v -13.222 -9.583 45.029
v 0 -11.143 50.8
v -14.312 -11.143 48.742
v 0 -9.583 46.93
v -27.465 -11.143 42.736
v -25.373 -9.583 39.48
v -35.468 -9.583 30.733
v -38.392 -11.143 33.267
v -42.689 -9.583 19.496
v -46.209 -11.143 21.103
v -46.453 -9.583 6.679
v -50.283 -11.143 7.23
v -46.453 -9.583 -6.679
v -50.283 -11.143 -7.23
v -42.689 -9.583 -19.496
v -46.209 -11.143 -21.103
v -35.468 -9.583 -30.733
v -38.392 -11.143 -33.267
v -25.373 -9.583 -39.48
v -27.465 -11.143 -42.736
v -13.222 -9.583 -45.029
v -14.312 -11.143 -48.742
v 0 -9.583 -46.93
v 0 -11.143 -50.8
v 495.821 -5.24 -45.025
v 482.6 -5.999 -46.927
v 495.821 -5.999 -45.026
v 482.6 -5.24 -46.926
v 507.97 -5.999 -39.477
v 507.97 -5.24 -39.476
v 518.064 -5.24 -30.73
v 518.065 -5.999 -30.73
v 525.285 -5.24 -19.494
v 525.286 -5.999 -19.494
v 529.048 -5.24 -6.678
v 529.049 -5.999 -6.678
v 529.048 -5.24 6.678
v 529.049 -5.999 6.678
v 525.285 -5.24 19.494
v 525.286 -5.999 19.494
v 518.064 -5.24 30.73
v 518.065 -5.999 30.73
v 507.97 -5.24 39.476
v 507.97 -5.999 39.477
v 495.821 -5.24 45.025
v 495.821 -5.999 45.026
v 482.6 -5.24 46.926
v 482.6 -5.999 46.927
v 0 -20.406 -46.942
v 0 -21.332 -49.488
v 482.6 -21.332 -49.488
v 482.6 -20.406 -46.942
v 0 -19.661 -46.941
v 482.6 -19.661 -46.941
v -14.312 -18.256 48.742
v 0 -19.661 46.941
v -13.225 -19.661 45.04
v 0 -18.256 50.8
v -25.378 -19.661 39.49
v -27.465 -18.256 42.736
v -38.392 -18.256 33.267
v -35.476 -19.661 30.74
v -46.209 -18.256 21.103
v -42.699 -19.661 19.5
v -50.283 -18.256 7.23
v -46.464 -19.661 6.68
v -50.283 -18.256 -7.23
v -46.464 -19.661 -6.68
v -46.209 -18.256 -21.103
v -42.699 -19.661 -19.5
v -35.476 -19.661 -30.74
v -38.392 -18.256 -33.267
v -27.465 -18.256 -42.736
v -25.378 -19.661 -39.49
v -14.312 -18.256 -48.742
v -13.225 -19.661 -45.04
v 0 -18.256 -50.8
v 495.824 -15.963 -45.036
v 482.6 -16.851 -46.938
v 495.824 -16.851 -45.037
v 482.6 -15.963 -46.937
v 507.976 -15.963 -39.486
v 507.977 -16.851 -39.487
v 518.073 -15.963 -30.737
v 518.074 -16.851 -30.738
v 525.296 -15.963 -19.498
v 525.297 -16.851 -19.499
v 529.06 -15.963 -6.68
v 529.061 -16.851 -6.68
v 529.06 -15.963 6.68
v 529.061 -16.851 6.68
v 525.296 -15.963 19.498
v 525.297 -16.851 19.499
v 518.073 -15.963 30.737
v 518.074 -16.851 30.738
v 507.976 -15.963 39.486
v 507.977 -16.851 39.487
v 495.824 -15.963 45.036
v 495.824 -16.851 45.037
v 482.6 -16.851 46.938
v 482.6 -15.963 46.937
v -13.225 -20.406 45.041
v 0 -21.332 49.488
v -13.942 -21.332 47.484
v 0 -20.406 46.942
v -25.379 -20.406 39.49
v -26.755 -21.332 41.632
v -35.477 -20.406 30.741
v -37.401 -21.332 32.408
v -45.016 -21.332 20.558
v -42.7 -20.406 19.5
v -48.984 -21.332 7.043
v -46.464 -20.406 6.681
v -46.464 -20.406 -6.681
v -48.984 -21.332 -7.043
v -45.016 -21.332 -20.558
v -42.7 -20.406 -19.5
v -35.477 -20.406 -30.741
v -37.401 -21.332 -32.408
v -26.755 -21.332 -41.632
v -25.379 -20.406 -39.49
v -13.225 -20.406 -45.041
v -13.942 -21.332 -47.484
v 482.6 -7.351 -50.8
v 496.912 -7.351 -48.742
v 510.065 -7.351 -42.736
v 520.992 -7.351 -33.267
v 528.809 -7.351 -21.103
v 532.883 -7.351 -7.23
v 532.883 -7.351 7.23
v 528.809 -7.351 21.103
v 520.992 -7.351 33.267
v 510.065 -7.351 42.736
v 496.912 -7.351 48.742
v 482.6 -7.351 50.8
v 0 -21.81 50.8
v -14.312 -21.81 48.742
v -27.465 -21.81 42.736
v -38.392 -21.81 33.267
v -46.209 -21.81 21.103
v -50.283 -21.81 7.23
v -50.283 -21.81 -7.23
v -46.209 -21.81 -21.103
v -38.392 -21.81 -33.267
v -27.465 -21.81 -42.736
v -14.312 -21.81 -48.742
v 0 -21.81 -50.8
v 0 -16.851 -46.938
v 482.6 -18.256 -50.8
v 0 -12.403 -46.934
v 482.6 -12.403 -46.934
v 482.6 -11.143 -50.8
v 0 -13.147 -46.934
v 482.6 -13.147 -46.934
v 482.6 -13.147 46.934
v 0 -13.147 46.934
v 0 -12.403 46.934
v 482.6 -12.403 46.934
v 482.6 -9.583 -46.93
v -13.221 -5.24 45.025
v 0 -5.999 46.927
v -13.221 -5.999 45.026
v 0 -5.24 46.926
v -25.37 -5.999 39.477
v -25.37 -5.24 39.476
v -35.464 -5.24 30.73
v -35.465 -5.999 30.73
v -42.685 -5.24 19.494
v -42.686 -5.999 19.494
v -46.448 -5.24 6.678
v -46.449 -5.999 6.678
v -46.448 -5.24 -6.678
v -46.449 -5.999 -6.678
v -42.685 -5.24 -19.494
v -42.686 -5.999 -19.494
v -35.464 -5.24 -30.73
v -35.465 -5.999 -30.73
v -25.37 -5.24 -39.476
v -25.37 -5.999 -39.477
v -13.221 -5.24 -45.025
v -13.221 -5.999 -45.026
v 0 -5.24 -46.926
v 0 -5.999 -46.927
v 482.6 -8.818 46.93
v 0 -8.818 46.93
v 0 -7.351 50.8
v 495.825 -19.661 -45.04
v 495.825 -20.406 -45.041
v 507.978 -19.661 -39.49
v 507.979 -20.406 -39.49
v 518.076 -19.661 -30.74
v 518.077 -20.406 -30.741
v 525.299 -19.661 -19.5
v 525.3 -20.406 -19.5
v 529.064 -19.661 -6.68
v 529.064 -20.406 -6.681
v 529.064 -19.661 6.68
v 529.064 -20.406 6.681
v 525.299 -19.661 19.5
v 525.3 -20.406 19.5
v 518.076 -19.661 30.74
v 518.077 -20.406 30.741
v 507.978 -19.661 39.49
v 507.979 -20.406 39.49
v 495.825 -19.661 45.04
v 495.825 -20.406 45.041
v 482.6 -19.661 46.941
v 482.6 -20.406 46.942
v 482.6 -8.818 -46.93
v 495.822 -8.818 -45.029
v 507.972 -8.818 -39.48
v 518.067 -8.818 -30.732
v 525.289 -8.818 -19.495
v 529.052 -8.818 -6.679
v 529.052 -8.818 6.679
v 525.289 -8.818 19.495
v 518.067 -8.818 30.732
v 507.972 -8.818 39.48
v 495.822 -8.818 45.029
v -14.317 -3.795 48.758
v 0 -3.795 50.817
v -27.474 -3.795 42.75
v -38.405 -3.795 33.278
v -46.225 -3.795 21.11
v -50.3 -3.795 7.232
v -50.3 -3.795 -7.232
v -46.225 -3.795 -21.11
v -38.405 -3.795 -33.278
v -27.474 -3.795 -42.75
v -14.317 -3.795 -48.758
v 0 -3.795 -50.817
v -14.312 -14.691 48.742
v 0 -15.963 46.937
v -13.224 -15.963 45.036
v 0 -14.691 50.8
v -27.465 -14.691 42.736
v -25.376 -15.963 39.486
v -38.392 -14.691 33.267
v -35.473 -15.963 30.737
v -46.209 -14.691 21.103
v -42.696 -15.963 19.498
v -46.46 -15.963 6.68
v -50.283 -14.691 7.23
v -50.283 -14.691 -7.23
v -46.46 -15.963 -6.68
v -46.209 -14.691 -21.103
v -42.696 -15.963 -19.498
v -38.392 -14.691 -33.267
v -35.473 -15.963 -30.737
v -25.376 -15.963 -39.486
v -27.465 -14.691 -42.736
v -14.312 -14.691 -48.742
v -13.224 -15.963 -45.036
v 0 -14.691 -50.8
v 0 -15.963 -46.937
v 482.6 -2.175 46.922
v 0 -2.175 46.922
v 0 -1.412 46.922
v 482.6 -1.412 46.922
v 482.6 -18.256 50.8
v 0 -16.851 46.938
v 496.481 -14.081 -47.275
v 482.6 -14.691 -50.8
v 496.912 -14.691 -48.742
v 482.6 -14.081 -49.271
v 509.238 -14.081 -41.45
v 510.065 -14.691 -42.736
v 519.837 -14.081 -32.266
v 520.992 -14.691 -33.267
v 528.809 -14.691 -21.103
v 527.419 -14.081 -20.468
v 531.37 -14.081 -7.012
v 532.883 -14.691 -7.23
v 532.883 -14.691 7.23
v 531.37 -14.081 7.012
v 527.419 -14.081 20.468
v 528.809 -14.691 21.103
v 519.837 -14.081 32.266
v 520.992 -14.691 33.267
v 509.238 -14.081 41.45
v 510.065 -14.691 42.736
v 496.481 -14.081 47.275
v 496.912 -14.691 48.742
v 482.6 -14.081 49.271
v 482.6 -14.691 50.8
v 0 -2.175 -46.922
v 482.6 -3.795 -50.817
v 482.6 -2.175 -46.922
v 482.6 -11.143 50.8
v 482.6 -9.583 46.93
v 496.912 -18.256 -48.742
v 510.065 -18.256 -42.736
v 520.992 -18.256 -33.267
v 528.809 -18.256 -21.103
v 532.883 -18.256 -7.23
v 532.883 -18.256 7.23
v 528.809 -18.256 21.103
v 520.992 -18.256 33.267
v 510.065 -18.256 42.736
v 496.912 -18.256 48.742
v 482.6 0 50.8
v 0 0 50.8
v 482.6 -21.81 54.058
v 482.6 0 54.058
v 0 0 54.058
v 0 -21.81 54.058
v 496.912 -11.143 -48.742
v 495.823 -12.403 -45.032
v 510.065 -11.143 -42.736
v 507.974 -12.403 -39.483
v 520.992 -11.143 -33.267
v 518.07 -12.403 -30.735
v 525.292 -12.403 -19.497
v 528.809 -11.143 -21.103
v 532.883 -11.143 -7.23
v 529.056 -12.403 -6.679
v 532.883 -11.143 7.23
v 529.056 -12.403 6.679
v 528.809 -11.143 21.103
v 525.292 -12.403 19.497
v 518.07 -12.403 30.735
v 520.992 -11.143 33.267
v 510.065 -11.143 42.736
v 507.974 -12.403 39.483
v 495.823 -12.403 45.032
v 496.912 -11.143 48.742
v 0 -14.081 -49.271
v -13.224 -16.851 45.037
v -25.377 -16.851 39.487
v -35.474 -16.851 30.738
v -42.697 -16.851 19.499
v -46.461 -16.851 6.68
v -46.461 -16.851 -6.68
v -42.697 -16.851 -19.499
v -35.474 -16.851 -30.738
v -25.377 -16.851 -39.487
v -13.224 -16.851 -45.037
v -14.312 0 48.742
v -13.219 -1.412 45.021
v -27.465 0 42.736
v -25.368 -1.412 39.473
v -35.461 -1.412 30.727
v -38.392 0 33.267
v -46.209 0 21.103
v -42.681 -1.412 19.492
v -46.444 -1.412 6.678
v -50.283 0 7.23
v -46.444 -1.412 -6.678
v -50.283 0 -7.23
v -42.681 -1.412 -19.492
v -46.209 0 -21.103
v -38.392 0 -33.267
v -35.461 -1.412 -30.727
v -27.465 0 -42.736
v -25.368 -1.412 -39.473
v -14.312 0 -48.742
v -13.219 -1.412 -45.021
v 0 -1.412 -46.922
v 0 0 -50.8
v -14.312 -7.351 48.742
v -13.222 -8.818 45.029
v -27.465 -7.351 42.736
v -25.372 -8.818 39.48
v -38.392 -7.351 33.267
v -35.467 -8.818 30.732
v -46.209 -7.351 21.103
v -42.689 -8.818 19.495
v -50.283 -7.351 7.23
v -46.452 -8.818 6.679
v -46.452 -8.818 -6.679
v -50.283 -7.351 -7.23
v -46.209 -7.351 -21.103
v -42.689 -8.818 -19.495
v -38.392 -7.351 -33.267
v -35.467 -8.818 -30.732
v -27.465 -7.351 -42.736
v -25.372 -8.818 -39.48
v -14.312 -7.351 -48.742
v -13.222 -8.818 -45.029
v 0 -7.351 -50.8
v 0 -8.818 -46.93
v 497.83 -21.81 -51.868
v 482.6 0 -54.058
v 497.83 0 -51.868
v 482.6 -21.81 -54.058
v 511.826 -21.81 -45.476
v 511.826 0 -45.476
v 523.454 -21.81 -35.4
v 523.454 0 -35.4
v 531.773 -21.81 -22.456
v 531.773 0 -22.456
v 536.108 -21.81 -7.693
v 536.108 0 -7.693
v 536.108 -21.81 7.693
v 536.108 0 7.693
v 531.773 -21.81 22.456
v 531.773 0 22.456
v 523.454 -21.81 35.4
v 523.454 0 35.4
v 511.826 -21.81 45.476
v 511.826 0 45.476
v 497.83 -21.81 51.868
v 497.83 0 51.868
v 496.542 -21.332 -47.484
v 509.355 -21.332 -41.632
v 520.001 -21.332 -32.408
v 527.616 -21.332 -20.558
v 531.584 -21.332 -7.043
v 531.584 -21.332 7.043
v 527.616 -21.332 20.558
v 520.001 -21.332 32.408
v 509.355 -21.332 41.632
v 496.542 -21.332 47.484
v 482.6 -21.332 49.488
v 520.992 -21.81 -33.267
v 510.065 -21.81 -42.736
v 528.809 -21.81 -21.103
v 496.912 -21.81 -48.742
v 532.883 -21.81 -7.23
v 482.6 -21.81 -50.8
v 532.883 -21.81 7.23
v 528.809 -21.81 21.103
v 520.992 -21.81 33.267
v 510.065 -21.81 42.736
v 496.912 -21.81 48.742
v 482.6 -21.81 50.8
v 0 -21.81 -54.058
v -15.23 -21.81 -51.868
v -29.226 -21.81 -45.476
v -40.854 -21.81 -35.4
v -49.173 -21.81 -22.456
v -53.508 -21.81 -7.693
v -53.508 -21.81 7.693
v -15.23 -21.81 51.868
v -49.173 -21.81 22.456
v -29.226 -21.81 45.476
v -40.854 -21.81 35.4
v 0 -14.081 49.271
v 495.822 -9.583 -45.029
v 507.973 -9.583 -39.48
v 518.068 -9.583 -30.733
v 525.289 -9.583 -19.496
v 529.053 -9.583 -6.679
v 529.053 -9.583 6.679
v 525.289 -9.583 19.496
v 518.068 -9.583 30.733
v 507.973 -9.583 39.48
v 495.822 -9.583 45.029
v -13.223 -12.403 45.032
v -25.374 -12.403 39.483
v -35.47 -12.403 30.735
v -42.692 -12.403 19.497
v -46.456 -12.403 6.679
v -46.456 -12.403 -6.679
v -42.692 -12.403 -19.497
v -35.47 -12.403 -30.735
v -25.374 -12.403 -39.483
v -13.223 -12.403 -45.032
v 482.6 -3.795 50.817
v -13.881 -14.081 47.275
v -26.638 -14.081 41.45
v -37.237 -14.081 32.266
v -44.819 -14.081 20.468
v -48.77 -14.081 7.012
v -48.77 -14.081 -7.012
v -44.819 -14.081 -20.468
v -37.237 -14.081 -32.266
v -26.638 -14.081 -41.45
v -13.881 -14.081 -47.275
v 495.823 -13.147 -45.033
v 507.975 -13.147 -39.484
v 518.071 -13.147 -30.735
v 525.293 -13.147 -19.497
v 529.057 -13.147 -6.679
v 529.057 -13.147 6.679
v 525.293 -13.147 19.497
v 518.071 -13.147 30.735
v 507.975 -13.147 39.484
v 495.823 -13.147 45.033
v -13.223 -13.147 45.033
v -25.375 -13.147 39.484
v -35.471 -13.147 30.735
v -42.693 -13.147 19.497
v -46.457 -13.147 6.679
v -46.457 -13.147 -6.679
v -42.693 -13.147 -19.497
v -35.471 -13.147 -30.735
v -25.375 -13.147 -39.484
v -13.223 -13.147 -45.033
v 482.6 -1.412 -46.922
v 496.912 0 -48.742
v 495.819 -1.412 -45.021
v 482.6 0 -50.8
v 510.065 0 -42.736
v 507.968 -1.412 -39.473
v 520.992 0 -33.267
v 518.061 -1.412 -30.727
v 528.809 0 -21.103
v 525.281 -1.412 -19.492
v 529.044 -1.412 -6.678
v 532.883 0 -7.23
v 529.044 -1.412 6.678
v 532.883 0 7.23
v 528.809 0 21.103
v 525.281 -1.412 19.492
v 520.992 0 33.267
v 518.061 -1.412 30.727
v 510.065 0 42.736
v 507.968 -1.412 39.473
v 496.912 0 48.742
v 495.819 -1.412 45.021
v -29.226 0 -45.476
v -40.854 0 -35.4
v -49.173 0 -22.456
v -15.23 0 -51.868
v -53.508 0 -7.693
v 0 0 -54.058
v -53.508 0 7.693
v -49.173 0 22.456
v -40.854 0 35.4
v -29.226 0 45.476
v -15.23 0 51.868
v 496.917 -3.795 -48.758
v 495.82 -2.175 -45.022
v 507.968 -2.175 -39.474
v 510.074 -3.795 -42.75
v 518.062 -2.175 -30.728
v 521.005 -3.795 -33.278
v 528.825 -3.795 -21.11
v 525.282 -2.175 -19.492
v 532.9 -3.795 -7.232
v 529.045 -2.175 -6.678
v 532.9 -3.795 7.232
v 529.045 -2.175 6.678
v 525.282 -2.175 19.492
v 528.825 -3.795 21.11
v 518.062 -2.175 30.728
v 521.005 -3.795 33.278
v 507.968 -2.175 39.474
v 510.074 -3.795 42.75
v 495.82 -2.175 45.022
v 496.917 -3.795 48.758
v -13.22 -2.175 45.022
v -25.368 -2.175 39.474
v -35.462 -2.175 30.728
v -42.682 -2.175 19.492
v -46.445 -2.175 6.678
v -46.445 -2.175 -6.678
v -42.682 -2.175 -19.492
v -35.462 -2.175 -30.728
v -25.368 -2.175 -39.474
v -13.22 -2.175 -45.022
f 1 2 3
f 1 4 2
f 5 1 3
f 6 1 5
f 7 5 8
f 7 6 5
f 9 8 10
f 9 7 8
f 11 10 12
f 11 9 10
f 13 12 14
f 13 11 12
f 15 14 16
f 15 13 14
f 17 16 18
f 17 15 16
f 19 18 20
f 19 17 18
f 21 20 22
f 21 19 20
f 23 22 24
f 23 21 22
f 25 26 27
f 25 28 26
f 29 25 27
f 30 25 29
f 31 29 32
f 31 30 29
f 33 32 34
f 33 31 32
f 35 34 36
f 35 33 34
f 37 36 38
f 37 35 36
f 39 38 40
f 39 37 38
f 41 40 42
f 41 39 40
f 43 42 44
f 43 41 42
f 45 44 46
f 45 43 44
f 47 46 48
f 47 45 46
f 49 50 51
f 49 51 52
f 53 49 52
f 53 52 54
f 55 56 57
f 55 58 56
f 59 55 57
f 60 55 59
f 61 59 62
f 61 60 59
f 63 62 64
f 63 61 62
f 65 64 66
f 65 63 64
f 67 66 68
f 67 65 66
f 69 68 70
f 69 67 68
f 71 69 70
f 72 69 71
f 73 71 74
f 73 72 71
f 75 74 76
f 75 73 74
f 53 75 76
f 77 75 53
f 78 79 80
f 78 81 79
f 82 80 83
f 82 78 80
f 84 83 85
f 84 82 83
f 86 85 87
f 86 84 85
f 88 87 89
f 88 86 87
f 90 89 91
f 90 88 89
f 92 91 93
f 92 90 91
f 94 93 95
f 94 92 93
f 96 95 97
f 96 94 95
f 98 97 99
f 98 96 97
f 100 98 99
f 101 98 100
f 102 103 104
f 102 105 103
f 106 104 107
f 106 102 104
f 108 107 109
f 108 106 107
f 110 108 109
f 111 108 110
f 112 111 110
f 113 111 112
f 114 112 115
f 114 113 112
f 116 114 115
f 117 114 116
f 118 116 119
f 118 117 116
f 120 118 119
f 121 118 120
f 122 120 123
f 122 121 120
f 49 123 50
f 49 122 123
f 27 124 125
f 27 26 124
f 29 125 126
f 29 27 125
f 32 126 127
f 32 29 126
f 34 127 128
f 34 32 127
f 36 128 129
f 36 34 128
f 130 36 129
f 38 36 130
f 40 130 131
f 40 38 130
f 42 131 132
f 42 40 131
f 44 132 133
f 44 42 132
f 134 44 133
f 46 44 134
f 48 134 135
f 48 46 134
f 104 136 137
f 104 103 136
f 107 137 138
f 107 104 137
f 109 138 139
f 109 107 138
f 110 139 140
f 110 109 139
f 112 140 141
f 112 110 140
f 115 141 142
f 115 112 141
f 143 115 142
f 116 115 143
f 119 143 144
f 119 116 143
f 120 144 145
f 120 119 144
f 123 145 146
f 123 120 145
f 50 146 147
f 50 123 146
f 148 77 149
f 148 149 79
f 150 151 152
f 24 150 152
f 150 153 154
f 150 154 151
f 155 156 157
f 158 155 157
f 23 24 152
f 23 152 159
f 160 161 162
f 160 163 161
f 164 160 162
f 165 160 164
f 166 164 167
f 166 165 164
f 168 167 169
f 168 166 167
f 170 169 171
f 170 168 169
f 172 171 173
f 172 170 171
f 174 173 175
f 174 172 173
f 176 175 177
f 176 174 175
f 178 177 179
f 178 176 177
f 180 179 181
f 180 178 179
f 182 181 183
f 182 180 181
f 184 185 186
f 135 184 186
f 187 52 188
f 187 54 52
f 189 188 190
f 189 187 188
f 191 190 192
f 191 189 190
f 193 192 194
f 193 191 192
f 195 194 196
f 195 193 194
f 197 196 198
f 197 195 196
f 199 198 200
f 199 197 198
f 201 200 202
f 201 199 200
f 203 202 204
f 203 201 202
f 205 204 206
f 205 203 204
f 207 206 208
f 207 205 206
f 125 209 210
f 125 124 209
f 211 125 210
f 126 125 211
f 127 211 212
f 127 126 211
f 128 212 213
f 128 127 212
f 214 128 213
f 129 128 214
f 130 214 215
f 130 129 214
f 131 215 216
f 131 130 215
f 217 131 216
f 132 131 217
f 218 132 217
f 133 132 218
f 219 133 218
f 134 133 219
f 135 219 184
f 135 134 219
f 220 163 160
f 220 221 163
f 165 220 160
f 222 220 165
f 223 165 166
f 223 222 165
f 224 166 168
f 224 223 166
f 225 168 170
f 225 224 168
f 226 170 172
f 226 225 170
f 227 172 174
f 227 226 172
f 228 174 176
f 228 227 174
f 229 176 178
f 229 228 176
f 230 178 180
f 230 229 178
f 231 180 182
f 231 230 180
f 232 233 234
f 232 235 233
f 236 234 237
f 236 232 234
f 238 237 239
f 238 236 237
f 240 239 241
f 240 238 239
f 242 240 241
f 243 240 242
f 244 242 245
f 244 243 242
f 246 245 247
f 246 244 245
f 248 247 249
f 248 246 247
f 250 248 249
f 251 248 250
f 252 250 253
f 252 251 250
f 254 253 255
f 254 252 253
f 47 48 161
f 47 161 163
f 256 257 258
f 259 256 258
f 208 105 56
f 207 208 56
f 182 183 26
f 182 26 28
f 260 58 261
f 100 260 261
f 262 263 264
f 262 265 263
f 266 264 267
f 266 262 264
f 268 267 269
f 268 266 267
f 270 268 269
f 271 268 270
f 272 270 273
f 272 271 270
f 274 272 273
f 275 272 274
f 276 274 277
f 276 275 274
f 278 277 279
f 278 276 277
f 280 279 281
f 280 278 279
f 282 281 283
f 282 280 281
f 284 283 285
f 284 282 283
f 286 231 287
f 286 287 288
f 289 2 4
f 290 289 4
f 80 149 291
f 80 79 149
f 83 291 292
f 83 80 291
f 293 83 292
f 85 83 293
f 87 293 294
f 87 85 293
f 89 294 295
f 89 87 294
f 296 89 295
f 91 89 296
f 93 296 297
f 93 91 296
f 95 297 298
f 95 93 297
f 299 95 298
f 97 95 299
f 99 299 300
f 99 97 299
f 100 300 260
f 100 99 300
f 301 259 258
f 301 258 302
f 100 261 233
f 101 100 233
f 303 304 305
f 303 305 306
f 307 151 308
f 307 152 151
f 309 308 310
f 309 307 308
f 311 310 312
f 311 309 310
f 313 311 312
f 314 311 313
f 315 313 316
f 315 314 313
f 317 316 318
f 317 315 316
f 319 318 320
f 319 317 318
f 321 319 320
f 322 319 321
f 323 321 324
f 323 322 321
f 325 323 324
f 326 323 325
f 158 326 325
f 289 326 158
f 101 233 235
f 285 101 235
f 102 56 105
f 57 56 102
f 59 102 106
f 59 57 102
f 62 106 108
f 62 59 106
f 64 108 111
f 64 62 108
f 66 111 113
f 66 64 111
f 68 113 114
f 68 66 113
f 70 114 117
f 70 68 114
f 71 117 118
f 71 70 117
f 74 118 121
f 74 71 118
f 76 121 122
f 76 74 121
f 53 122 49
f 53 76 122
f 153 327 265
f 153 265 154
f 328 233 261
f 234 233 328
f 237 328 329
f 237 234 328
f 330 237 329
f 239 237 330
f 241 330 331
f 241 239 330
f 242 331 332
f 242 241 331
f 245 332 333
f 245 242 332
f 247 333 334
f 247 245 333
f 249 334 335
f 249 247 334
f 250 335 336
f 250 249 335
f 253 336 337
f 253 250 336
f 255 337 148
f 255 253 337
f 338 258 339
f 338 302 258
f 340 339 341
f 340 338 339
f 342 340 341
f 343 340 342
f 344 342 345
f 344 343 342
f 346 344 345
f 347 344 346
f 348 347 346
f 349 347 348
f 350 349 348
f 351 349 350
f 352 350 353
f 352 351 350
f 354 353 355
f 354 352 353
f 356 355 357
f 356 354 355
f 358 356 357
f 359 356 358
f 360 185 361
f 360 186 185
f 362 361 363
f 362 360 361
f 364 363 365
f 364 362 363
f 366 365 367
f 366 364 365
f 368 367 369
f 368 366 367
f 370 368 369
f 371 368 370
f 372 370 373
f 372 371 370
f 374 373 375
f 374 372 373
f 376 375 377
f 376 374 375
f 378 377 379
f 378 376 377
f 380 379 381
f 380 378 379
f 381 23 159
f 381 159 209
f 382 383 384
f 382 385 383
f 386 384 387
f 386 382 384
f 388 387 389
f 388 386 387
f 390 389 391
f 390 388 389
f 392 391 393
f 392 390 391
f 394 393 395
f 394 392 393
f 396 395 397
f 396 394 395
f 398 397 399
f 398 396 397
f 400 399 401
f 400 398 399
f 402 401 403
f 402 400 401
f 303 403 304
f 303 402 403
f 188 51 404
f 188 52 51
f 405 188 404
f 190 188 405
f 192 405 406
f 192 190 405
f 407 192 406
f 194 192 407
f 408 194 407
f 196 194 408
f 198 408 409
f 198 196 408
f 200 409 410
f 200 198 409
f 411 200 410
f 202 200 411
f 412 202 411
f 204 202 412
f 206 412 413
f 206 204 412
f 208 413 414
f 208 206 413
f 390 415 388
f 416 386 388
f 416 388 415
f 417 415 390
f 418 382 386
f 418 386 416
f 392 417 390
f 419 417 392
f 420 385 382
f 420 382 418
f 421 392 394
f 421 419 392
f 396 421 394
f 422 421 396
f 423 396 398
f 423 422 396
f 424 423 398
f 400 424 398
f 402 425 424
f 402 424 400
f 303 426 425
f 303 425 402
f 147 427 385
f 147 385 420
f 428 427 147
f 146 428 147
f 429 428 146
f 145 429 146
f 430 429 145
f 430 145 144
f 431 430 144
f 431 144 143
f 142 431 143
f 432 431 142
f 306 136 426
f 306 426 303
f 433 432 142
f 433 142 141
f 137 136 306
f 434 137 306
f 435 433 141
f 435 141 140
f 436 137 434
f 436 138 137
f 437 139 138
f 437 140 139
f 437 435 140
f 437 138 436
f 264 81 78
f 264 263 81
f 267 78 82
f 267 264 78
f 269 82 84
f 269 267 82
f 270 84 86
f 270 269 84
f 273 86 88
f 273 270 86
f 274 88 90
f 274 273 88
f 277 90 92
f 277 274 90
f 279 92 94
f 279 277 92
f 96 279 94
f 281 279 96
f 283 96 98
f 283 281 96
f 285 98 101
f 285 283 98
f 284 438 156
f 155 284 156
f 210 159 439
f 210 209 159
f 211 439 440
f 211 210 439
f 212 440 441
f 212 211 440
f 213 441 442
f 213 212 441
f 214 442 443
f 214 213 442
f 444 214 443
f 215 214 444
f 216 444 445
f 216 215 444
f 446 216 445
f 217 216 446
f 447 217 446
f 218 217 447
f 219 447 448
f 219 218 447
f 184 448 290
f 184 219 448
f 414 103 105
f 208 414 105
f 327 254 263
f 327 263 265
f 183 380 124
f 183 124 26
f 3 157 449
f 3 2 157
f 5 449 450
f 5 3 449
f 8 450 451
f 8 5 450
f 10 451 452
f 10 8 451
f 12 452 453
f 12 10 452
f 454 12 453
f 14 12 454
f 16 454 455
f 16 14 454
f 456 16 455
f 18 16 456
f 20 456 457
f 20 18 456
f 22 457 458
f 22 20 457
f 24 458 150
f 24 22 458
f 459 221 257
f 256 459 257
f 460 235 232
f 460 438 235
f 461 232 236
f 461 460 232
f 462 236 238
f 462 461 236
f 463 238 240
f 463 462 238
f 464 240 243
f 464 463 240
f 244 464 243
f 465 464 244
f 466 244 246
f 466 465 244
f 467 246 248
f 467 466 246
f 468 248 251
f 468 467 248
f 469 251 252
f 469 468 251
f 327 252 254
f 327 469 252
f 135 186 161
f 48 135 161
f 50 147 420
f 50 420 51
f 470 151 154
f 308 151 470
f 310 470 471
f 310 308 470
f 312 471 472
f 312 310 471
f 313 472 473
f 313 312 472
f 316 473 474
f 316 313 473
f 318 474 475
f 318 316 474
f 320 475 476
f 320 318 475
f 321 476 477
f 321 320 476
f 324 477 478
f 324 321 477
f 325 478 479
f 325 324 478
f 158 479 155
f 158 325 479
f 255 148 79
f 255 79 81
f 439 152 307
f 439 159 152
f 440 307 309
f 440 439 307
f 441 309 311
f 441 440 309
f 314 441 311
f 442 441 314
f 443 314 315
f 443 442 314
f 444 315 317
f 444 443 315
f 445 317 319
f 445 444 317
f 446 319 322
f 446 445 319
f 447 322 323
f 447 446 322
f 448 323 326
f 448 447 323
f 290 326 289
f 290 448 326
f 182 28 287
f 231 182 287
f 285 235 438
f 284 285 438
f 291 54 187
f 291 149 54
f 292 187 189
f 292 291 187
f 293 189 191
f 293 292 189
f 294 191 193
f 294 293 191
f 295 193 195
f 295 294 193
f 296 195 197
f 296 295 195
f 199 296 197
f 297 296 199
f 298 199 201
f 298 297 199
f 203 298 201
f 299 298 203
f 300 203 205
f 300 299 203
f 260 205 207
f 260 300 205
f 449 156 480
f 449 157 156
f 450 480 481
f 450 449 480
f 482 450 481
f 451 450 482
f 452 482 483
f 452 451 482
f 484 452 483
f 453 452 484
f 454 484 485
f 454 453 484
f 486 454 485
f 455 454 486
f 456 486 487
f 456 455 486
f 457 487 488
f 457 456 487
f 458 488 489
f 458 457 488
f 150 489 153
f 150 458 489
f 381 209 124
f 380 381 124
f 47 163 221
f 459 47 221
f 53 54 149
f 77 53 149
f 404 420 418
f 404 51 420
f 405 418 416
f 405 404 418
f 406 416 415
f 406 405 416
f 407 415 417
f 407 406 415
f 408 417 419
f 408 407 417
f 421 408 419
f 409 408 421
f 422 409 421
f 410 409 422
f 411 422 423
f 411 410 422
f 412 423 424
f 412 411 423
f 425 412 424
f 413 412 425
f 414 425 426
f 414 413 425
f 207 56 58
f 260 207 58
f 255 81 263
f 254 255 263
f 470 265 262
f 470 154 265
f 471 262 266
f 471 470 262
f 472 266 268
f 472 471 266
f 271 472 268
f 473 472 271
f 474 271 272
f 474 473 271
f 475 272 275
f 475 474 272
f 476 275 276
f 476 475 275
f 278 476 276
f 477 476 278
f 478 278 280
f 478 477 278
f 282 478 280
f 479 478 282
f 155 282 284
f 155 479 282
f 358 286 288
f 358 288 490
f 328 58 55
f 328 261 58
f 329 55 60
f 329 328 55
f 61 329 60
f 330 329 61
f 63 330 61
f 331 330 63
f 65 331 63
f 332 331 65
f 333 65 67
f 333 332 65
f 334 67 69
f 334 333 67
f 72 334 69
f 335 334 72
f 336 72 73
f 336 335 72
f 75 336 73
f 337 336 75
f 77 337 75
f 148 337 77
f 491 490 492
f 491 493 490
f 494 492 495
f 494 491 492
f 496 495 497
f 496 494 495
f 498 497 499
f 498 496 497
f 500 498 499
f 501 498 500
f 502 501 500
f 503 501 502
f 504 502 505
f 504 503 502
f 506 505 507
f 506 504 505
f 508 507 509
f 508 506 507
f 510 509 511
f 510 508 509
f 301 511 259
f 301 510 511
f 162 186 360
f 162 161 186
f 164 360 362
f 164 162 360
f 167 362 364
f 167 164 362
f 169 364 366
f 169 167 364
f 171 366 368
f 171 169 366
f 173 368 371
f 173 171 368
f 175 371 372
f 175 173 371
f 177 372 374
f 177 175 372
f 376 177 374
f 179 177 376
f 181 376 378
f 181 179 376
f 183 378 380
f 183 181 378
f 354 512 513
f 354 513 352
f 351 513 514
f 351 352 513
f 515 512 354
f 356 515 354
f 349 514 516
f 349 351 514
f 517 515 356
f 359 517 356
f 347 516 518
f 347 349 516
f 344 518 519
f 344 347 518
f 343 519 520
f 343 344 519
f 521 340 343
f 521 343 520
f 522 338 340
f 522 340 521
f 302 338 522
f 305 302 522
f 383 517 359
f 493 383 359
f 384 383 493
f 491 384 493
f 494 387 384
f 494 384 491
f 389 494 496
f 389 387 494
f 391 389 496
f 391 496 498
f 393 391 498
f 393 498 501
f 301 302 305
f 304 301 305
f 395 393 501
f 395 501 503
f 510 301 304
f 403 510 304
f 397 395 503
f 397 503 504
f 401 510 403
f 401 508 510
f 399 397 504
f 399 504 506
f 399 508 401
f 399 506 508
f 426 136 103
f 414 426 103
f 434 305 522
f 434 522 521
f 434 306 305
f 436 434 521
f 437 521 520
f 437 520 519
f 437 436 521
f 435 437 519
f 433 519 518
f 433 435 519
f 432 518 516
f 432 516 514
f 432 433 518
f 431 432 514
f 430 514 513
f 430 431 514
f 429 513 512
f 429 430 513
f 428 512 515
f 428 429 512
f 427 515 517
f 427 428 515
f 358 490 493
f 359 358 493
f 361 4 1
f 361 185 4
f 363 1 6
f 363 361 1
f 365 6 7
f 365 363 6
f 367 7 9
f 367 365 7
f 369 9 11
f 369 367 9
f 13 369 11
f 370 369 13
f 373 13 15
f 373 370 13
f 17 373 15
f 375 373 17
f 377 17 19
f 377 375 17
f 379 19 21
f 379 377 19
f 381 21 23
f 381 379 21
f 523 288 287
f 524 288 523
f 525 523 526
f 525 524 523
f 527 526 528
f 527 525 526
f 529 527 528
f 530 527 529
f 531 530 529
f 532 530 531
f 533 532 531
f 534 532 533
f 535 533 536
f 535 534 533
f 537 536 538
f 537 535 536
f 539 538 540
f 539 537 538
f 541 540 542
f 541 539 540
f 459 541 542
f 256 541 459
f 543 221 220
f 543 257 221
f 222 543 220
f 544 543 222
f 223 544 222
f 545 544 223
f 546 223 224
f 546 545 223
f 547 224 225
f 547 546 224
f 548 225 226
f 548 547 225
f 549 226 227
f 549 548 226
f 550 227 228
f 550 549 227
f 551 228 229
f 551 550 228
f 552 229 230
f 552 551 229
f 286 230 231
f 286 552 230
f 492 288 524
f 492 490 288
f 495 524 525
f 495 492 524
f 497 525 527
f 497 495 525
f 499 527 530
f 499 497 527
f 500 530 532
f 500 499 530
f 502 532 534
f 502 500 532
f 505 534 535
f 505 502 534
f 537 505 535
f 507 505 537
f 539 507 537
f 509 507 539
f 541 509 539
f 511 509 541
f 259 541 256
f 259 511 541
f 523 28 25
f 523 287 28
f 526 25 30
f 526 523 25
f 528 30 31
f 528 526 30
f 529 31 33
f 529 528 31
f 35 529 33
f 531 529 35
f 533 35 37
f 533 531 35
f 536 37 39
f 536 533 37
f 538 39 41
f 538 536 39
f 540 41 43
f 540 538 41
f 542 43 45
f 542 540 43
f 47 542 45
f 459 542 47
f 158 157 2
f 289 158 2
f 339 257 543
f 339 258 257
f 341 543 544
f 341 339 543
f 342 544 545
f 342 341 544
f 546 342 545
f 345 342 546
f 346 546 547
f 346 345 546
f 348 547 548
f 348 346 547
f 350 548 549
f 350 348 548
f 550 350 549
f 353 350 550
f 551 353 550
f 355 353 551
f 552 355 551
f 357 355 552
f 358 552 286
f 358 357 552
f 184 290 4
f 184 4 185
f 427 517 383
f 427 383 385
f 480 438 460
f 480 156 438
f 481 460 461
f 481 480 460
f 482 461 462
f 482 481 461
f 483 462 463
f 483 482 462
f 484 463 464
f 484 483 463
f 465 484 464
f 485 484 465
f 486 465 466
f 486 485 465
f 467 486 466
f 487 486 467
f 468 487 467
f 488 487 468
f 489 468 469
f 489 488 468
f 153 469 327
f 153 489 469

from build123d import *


with BuildPart() as f2:
    # F2: sweep along a path in F0
    with BuildLine(Plane.XZ) as f2_path:
        ThreePointArc((482.6, -50.800001), (533.4, -1e-06), (482.6, 50.799999))
        Line((482.6, 50.799999), (0, 50.799997))
        ThreePointArc((0, 50.799997), (-50.8, -3e-06), (0, -50.800003))
        Line((0, -50.800003), (482.6, -50.800001))
    # F1 (on Right) → F2 (sweep)
    with BuildSketch(Plane.YZ):
        Polygon((0, 54.057884), (-21.809931, 54.057884), (-21.809931, 50.799997), (-21.33248, 49.488209), (-20.405807, 46.942197), (-19.660659, 46.941388), (-18.25624, 50.799997), (-16.850712, 46.938339), (-15.963142, 46.937376), (-14.691085, 50.799997), (-14.080521, 49.271312), (-13.147116, 46.934321), (-12.402659, 46.933513), (-11.143086, 50.799997), (-9.583137, 46.930454), (-8.817837, 46.929623), (-7.350765, 50.799997), (-5.998807, 46.926565), (-5.239619, 46.925741), (-3.794765, 50.816843), (-2.175224, 46.922416), (-1.411626, 46.921587), (0, 50.799997), align=None)
    sweep(path=f2_path.line)


solid = f2.part
